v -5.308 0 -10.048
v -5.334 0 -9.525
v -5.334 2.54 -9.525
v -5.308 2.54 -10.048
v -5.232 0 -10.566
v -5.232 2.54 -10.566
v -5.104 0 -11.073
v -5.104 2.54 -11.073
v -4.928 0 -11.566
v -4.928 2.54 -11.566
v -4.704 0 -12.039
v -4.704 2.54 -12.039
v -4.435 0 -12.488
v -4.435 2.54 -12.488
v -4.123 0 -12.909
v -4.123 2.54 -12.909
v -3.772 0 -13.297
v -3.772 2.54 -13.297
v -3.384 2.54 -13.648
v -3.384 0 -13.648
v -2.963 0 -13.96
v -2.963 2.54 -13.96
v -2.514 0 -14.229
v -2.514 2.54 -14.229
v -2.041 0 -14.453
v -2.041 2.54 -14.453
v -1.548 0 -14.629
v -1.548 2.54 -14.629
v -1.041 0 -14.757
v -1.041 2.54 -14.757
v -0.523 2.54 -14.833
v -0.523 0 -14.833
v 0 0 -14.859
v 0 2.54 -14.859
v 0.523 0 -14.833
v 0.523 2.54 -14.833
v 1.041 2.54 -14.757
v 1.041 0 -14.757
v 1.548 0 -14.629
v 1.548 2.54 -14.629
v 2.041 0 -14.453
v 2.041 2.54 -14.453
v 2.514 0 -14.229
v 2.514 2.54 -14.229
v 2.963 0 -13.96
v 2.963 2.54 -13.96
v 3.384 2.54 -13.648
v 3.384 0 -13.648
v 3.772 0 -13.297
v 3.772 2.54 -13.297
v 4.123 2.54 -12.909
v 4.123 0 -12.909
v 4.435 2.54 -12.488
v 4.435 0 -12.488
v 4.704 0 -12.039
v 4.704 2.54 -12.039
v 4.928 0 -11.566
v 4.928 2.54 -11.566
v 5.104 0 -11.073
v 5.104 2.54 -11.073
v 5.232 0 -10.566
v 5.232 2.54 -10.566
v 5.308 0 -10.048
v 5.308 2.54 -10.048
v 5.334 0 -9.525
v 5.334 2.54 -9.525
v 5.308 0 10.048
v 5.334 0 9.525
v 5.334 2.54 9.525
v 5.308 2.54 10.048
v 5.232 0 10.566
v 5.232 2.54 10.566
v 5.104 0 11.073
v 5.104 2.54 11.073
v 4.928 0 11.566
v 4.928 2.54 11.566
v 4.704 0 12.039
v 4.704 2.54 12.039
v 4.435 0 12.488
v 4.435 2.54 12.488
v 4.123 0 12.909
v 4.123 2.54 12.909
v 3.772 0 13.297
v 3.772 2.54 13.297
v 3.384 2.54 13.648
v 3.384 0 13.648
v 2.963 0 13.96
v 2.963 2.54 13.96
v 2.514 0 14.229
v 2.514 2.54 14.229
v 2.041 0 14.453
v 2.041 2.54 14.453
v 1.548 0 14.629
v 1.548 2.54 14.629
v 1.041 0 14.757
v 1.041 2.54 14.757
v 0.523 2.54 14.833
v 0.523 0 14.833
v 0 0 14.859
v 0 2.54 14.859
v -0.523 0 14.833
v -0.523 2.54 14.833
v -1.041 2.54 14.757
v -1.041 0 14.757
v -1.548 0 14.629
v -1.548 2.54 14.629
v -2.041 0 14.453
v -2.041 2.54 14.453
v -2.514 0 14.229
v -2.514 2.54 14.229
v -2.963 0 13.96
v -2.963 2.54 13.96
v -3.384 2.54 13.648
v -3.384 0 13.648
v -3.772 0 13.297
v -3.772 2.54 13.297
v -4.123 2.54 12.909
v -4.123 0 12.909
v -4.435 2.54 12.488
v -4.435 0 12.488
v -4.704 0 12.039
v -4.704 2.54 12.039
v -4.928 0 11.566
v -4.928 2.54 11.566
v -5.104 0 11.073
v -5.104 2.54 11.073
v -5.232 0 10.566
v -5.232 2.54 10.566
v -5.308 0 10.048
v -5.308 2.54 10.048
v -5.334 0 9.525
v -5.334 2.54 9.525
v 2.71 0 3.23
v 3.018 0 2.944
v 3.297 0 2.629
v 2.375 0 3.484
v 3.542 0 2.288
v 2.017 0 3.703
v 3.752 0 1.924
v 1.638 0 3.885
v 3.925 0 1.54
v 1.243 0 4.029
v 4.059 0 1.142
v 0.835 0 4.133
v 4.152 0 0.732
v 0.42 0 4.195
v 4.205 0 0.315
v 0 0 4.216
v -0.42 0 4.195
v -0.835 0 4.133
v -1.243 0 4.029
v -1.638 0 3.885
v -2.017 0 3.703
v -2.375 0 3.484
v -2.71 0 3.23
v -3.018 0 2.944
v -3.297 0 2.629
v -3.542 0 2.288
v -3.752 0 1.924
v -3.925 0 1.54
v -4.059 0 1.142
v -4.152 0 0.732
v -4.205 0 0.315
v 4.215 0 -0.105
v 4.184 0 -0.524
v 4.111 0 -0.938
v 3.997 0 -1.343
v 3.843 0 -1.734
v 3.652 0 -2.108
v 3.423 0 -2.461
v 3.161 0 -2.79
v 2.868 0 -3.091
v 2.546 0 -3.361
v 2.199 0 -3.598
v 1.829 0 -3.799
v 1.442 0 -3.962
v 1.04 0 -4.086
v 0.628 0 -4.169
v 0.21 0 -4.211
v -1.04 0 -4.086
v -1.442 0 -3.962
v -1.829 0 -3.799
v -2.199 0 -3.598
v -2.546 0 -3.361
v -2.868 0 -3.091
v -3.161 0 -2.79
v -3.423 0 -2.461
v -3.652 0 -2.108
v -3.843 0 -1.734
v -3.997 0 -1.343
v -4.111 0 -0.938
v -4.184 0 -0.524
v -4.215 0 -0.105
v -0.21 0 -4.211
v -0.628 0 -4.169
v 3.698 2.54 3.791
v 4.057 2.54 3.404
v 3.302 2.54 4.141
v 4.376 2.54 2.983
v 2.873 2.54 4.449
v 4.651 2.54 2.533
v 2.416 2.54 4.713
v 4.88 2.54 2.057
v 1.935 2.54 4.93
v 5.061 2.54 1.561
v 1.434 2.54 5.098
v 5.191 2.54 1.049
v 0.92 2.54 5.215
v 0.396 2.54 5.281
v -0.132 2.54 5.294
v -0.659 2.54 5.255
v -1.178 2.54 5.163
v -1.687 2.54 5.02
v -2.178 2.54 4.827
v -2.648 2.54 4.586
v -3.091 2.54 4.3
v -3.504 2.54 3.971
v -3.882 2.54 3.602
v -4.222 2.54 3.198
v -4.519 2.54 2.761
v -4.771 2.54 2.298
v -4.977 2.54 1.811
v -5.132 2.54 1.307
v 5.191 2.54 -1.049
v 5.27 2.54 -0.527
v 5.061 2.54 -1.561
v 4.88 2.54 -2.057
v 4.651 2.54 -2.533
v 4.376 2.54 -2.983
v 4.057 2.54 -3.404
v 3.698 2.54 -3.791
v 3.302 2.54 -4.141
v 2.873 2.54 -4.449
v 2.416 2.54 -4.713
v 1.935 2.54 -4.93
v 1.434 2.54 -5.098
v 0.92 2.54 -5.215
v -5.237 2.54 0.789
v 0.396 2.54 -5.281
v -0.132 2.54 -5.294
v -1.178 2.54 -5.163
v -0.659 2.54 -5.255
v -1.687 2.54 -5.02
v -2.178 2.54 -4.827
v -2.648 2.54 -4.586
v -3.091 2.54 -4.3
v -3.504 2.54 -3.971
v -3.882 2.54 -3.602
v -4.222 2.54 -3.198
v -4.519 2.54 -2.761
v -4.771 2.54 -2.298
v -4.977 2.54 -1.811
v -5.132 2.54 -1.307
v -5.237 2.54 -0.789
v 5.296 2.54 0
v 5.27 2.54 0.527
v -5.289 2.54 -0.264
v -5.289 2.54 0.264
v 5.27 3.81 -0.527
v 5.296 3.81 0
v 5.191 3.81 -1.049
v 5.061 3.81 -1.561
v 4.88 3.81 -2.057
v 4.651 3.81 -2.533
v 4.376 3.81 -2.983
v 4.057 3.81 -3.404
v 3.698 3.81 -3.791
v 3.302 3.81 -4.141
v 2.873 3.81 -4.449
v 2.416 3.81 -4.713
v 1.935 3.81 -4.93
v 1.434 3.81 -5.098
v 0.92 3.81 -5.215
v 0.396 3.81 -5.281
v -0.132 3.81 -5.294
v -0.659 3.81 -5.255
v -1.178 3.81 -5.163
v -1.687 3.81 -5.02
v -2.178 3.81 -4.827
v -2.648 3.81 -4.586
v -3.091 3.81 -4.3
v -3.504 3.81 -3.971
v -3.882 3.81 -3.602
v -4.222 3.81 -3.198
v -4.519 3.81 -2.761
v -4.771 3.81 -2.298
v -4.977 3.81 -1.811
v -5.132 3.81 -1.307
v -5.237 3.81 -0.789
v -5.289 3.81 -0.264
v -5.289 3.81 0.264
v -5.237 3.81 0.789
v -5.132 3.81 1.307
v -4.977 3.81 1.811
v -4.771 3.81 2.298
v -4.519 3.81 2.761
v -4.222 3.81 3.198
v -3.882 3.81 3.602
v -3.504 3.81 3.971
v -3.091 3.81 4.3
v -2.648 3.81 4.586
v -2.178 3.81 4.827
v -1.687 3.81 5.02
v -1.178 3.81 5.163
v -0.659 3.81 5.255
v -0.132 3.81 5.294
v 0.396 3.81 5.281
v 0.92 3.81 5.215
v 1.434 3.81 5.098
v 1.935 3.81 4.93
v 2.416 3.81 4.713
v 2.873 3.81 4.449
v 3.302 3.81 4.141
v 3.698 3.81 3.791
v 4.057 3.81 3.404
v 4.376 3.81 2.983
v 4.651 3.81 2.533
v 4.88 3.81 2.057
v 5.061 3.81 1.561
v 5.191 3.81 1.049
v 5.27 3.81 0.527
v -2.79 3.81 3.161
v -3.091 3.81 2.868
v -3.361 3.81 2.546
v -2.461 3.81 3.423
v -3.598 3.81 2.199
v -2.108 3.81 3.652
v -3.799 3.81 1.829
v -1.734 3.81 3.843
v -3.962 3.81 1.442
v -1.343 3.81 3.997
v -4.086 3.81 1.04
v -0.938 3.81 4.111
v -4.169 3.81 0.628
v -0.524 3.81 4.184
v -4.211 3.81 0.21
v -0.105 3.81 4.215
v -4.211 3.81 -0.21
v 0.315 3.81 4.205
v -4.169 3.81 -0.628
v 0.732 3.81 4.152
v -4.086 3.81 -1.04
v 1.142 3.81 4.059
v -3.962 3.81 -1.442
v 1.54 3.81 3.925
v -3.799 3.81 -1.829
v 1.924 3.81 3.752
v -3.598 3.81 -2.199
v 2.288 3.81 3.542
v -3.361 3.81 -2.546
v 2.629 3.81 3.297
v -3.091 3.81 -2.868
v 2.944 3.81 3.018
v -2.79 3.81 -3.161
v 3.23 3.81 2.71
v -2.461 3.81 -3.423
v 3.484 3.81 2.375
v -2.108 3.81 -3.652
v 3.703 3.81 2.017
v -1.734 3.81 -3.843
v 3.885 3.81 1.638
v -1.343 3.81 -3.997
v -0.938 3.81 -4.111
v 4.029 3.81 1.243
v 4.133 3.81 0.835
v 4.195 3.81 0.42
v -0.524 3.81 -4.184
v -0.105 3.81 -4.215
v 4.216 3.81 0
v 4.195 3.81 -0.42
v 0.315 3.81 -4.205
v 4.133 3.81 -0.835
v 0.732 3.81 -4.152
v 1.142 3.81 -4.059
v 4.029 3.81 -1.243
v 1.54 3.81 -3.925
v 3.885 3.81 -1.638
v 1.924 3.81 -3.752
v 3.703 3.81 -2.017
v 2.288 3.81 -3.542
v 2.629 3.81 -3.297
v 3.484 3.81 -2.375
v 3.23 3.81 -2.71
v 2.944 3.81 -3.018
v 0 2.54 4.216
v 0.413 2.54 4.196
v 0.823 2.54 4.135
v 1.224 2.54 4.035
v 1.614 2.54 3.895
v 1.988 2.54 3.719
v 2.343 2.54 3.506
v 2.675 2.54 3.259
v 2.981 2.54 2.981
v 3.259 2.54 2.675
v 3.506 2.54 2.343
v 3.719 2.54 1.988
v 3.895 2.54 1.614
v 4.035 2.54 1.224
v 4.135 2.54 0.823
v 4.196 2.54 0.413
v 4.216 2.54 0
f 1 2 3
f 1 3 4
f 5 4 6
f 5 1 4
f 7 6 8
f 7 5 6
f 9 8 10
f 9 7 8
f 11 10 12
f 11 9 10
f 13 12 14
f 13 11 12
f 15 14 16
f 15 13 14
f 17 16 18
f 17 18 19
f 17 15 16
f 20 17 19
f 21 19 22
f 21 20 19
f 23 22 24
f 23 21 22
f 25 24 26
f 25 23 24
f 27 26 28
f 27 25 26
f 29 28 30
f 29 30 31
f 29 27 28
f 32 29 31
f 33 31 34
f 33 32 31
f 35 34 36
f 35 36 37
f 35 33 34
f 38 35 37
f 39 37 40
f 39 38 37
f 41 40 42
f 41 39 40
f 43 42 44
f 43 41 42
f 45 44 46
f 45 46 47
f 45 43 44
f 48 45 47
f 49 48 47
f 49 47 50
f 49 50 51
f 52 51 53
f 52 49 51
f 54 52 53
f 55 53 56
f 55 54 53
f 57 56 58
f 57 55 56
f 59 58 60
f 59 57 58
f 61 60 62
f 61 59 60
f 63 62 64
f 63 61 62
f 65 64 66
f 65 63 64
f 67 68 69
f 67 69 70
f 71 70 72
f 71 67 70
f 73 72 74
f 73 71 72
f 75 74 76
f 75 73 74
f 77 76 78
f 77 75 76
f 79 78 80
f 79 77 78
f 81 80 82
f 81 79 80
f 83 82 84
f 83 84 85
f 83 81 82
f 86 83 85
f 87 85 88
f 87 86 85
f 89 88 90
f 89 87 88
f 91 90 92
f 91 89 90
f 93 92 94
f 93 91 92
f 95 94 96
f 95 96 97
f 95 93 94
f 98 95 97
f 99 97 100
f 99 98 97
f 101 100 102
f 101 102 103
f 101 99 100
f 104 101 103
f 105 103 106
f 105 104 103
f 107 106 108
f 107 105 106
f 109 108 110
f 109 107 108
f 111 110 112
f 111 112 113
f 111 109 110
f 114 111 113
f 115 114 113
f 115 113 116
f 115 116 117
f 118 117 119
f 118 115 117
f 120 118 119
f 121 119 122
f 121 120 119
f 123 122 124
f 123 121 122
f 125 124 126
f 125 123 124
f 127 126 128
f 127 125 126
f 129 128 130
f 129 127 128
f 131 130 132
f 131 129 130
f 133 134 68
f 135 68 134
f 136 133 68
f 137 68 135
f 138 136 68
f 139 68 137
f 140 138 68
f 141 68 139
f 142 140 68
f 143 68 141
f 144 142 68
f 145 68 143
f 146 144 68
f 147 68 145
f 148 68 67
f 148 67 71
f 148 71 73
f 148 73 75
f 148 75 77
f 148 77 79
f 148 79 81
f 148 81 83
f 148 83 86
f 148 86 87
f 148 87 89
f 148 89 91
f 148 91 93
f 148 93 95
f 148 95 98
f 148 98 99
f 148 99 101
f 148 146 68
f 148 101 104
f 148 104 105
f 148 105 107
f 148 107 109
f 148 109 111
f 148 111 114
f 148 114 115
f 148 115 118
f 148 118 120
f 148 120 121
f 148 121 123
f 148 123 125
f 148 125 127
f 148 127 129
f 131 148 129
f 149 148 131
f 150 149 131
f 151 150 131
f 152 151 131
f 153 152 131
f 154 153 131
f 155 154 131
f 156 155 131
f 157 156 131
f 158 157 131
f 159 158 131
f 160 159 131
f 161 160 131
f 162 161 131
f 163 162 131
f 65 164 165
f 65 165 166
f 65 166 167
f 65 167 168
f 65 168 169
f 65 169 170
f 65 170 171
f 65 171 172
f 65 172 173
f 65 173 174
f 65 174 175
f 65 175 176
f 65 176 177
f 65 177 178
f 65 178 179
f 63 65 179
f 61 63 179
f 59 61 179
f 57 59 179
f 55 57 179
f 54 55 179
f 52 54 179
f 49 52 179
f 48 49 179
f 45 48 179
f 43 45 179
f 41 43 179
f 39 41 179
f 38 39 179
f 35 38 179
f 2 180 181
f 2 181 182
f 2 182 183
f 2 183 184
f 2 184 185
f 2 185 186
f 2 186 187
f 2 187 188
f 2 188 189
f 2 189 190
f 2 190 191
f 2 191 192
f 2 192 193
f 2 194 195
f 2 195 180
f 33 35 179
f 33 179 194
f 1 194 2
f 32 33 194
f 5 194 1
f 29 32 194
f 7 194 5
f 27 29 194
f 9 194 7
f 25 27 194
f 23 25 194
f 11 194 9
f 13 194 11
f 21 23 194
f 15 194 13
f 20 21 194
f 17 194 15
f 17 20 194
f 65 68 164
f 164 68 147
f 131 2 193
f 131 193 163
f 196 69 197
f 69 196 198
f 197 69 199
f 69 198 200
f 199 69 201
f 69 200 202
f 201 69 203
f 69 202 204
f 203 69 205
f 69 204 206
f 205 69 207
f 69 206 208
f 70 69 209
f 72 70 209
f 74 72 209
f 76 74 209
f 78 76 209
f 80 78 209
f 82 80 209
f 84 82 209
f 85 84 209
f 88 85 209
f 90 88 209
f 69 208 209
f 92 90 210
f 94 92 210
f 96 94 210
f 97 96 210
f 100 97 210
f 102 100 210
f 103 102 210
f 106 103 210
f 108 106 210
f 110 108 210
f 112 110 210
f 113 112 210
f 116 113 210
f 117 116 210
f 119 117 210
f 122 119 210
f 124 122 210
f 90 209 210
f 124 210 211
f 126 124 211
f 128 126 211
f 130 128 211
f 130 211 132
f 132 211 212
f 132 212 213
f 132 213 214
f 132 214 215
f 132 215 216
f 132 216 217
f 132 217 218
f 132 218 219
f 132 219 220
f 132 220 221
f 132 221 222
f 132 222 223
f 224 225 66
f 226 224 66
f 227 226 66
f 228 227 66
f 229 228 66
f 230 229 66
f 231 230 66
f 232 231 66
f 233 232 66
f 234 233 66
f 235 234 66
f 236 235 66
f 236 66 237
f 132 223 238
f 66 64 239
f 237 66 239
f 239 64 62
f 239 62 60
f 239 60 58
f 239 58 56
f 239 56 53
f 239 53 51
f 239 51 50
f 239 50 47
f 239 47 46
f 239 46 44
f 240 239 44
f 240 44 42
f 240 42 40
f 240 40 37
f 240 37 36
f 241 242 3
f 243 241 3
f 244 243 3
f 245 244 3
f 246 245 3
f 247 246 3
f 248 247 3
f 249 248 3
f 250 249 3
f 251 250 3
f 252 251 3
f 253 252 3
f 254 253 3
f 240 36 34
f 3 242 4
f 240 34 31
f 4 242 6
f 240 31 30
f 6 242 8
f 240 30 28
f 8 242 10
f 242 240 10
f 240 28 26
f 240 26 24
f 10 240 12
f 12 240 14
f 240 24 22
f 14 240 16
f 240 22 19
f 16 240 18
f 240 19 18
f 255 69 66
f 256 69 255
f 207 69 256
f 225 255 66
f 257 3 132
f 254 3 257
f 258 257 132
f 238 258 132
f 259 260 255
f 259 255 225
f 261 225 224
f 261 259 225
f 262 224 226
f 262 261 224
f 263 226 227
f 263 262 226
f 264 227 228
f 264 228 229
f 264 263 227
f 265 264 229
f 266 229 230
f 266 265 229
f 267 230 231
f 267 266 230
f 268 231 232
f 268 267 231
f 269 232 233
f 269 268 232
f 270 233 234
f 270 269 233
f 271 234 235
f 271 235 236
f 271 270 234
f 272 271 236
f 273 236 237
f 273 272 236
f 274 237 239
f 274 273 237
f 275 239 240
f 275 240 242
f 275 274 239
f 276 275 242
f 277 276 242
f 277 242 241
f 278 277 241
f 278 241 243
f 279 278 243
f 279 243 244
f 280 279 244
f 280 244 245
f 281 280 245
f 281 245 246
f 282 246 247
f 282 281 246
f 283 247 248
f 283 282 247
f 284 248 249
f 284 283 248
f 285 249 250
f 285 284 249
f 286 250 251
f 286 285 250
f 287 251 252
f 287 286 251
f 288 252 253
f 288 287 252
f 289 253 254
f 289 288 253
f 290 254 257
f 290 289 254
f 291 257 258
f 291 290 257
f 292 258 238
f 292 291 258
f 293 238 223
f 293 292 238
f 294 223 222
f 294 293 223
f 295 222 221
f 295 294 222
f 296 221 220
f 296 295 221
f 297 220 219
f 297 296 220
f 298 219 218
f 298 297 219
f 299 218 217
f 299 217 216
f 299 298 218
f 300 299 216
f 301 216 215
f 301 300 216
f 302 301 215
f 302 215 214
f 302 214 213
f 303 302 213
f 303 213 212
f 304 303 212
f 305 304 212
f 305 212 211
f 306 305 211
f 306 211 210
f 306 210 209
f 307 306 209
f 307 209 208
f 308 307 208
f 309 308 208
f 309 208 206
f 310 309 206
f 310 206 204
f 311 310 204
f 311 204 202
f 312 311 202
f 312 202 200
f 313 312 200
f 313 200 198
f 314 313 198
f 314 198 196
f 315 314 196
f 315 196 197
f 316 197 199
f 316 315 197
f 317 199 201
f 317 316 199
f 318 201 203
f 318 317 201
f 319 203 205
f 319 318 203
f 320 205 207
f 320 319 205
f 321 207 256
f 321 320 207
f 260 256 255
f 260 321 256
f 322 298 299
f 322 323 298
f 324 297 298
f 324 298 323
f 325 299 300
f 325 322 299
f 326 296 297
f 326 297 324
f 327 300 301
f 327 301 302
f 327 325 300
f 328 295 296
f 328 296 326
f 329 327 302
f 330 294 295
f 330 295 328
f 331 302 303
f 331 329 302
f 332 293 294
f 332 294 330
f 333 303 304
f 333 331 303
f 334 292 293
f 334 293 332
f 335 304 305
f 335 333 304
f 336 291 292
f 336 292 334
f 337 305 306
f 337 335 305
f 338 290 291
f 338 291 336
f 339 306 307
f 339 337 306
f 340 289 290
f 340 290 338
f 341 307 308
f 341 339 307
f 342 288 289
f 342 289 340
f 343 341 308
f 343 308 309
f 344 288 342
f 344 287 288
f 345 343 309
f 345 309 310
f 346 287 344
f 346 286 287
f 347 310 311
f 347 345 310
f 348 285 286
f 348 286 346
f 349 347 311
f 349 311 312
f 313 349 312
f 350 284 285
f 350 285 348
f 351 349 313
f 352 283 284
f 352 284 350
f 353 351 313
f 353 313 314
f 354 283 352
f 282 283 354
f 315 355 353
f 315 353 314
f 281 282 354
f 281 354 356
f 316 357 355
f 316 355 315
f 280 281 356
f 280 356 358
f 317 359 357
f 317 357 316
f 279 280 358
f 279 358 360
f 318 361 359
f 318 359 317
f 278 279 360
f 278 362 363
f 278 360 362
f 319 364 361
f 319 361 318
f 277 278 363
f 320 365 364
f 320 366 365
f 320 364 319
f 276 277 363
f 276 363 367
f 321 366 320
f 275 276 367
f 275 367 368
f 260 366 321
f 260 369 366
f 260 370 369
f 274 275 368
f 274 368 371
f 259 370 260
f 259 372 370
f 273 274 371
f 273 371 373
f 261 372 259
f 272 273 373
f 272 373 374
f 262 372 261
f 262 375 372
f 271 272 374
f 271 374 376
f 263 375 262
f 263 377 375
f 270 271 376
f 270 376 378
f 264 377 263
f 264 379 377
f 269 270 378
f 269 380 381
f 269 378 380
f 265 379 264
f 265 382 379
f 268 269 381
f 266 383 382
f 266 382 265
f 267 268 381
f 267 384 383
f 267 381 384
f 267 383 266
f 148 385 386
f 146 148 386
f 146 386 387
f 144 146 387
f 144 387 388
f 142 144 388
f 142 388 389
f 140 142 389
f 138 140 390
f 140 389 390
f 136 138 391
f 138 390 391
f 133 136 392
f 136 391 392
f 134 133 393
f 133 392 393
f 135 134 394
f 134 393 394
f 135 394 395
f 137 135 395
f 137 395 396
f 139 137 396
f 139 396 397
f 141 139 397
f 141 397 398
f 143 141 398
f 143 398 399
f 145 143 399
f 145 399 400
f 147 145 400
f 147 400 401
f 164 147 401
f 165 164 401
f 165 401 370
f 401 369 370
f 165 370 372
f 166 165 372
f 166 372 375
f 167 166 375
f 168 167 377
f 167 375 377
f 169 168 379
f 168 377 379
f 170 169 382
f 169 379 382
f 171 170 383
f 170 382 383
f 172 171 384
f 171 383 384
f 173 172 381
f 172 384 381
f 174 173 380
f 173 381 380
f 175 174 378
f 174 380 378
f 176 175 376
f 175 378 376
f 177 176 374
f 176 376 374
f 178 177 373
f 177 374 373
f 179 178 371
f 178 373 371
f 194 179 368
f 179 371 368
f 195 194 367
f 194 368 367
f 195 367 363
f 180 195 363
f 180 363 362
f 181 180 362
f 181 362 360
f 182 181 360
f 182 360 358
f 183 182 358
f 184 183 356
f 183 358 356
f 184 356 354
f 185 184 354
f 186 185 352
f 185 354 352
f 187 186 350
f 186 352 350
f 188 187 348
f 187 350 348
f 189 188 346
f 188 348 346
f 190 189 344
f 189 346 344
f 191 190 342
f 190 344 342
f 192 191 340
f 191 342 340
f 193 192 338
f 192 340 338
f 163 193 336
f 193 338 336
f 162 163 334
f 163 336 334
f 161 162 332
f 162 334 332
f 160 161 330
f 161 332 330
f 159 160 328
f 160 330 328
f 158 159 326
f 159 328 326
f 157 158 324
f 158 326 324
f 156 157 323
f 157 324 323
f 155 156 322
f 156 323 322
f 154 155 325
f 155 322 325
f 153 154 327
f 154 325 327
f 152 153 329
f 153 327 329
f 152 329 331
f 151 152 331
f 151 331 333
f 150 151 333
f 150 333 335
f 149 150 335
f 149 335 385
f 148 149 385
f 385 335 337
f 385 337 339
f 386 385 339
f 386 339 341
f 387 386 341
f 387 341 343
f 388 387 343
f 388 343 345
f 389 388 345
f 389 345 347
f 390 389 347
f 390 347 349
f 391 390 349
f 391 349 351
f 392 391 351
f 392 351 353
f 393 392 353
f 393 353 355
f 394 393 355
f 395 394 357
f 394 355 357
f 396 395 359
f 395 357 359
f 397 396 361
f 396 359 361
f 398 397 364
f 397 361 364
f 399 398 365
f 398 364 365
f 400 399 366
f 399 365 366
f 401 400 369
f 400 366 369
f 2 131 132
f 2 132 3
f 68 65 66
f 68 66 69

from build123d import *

# Parameters (mm, degrees)
BOSS_EXTRUDE1_DEPTH = 2.54
SKETCH2_R           = 4.2164
CUT_EXTRUDE1_DEPTH  = 2.54
EXTRUDE_THIN1_START = 1.27
SKETCH3_R           = 5.2959
SKETCH3_R_2         = 4.2164
EXTRUDE_THIN1_DEPTH = 1.27


with BuildPart() as part:
    # Sketch1 → Boss-Extrude1 (new body)
    with BuildSketch(Plane(origin=(0, 0, 0), x_dir=(1, 0, 0), z_dir=(0, 1, 0))):
        with BuildLine():
            Line((5.334, 9.525), (5.334, -9.525))
            ThreePointArc((5.334, -9.525), (0, -14.859), (-5.334, -9.525))
            Line((-5.334, -9.525), (-5.334, 9.525))
            ThreePointArc((-5.334, 9.525), (0, 14.859), (5.334, 9.525))
        make_face()
    extrude(amount=BOSS_EXTRUDE1_DEPTH)

    # Sketch2 → Cut-Extrude1 (cut)
    with BuildSketch(Plane(origin=(0, 2.54, 0), x_dir=(1, 0, 0), z_dir=(0, 1, 0))):
        with Locations(Location((0, 0, 0), (0, 0, 270))):
            Circle(SKETCH2_R)
    extrude(amount=-CUT_EXTRUDE1_DEPTH, mode=Mode.SUBTRACT)

    # Sketch3 → Extrude-Thin1 (add)
    with BuildSketch(Plane(origin=(0, 2.54, 0), x_dir=(1, 0, 0), z_dir=(0, 1, 0)).offset(EXTRUDE_THIN1_START)):
        Circle(SKETCH3_R)
        Circle(SKETCH3_R_2, mode=Mode.SUBTRACT)
    extrude(amount=-EXTRUDE_THIN1_DEPTH)


solid = part.part
